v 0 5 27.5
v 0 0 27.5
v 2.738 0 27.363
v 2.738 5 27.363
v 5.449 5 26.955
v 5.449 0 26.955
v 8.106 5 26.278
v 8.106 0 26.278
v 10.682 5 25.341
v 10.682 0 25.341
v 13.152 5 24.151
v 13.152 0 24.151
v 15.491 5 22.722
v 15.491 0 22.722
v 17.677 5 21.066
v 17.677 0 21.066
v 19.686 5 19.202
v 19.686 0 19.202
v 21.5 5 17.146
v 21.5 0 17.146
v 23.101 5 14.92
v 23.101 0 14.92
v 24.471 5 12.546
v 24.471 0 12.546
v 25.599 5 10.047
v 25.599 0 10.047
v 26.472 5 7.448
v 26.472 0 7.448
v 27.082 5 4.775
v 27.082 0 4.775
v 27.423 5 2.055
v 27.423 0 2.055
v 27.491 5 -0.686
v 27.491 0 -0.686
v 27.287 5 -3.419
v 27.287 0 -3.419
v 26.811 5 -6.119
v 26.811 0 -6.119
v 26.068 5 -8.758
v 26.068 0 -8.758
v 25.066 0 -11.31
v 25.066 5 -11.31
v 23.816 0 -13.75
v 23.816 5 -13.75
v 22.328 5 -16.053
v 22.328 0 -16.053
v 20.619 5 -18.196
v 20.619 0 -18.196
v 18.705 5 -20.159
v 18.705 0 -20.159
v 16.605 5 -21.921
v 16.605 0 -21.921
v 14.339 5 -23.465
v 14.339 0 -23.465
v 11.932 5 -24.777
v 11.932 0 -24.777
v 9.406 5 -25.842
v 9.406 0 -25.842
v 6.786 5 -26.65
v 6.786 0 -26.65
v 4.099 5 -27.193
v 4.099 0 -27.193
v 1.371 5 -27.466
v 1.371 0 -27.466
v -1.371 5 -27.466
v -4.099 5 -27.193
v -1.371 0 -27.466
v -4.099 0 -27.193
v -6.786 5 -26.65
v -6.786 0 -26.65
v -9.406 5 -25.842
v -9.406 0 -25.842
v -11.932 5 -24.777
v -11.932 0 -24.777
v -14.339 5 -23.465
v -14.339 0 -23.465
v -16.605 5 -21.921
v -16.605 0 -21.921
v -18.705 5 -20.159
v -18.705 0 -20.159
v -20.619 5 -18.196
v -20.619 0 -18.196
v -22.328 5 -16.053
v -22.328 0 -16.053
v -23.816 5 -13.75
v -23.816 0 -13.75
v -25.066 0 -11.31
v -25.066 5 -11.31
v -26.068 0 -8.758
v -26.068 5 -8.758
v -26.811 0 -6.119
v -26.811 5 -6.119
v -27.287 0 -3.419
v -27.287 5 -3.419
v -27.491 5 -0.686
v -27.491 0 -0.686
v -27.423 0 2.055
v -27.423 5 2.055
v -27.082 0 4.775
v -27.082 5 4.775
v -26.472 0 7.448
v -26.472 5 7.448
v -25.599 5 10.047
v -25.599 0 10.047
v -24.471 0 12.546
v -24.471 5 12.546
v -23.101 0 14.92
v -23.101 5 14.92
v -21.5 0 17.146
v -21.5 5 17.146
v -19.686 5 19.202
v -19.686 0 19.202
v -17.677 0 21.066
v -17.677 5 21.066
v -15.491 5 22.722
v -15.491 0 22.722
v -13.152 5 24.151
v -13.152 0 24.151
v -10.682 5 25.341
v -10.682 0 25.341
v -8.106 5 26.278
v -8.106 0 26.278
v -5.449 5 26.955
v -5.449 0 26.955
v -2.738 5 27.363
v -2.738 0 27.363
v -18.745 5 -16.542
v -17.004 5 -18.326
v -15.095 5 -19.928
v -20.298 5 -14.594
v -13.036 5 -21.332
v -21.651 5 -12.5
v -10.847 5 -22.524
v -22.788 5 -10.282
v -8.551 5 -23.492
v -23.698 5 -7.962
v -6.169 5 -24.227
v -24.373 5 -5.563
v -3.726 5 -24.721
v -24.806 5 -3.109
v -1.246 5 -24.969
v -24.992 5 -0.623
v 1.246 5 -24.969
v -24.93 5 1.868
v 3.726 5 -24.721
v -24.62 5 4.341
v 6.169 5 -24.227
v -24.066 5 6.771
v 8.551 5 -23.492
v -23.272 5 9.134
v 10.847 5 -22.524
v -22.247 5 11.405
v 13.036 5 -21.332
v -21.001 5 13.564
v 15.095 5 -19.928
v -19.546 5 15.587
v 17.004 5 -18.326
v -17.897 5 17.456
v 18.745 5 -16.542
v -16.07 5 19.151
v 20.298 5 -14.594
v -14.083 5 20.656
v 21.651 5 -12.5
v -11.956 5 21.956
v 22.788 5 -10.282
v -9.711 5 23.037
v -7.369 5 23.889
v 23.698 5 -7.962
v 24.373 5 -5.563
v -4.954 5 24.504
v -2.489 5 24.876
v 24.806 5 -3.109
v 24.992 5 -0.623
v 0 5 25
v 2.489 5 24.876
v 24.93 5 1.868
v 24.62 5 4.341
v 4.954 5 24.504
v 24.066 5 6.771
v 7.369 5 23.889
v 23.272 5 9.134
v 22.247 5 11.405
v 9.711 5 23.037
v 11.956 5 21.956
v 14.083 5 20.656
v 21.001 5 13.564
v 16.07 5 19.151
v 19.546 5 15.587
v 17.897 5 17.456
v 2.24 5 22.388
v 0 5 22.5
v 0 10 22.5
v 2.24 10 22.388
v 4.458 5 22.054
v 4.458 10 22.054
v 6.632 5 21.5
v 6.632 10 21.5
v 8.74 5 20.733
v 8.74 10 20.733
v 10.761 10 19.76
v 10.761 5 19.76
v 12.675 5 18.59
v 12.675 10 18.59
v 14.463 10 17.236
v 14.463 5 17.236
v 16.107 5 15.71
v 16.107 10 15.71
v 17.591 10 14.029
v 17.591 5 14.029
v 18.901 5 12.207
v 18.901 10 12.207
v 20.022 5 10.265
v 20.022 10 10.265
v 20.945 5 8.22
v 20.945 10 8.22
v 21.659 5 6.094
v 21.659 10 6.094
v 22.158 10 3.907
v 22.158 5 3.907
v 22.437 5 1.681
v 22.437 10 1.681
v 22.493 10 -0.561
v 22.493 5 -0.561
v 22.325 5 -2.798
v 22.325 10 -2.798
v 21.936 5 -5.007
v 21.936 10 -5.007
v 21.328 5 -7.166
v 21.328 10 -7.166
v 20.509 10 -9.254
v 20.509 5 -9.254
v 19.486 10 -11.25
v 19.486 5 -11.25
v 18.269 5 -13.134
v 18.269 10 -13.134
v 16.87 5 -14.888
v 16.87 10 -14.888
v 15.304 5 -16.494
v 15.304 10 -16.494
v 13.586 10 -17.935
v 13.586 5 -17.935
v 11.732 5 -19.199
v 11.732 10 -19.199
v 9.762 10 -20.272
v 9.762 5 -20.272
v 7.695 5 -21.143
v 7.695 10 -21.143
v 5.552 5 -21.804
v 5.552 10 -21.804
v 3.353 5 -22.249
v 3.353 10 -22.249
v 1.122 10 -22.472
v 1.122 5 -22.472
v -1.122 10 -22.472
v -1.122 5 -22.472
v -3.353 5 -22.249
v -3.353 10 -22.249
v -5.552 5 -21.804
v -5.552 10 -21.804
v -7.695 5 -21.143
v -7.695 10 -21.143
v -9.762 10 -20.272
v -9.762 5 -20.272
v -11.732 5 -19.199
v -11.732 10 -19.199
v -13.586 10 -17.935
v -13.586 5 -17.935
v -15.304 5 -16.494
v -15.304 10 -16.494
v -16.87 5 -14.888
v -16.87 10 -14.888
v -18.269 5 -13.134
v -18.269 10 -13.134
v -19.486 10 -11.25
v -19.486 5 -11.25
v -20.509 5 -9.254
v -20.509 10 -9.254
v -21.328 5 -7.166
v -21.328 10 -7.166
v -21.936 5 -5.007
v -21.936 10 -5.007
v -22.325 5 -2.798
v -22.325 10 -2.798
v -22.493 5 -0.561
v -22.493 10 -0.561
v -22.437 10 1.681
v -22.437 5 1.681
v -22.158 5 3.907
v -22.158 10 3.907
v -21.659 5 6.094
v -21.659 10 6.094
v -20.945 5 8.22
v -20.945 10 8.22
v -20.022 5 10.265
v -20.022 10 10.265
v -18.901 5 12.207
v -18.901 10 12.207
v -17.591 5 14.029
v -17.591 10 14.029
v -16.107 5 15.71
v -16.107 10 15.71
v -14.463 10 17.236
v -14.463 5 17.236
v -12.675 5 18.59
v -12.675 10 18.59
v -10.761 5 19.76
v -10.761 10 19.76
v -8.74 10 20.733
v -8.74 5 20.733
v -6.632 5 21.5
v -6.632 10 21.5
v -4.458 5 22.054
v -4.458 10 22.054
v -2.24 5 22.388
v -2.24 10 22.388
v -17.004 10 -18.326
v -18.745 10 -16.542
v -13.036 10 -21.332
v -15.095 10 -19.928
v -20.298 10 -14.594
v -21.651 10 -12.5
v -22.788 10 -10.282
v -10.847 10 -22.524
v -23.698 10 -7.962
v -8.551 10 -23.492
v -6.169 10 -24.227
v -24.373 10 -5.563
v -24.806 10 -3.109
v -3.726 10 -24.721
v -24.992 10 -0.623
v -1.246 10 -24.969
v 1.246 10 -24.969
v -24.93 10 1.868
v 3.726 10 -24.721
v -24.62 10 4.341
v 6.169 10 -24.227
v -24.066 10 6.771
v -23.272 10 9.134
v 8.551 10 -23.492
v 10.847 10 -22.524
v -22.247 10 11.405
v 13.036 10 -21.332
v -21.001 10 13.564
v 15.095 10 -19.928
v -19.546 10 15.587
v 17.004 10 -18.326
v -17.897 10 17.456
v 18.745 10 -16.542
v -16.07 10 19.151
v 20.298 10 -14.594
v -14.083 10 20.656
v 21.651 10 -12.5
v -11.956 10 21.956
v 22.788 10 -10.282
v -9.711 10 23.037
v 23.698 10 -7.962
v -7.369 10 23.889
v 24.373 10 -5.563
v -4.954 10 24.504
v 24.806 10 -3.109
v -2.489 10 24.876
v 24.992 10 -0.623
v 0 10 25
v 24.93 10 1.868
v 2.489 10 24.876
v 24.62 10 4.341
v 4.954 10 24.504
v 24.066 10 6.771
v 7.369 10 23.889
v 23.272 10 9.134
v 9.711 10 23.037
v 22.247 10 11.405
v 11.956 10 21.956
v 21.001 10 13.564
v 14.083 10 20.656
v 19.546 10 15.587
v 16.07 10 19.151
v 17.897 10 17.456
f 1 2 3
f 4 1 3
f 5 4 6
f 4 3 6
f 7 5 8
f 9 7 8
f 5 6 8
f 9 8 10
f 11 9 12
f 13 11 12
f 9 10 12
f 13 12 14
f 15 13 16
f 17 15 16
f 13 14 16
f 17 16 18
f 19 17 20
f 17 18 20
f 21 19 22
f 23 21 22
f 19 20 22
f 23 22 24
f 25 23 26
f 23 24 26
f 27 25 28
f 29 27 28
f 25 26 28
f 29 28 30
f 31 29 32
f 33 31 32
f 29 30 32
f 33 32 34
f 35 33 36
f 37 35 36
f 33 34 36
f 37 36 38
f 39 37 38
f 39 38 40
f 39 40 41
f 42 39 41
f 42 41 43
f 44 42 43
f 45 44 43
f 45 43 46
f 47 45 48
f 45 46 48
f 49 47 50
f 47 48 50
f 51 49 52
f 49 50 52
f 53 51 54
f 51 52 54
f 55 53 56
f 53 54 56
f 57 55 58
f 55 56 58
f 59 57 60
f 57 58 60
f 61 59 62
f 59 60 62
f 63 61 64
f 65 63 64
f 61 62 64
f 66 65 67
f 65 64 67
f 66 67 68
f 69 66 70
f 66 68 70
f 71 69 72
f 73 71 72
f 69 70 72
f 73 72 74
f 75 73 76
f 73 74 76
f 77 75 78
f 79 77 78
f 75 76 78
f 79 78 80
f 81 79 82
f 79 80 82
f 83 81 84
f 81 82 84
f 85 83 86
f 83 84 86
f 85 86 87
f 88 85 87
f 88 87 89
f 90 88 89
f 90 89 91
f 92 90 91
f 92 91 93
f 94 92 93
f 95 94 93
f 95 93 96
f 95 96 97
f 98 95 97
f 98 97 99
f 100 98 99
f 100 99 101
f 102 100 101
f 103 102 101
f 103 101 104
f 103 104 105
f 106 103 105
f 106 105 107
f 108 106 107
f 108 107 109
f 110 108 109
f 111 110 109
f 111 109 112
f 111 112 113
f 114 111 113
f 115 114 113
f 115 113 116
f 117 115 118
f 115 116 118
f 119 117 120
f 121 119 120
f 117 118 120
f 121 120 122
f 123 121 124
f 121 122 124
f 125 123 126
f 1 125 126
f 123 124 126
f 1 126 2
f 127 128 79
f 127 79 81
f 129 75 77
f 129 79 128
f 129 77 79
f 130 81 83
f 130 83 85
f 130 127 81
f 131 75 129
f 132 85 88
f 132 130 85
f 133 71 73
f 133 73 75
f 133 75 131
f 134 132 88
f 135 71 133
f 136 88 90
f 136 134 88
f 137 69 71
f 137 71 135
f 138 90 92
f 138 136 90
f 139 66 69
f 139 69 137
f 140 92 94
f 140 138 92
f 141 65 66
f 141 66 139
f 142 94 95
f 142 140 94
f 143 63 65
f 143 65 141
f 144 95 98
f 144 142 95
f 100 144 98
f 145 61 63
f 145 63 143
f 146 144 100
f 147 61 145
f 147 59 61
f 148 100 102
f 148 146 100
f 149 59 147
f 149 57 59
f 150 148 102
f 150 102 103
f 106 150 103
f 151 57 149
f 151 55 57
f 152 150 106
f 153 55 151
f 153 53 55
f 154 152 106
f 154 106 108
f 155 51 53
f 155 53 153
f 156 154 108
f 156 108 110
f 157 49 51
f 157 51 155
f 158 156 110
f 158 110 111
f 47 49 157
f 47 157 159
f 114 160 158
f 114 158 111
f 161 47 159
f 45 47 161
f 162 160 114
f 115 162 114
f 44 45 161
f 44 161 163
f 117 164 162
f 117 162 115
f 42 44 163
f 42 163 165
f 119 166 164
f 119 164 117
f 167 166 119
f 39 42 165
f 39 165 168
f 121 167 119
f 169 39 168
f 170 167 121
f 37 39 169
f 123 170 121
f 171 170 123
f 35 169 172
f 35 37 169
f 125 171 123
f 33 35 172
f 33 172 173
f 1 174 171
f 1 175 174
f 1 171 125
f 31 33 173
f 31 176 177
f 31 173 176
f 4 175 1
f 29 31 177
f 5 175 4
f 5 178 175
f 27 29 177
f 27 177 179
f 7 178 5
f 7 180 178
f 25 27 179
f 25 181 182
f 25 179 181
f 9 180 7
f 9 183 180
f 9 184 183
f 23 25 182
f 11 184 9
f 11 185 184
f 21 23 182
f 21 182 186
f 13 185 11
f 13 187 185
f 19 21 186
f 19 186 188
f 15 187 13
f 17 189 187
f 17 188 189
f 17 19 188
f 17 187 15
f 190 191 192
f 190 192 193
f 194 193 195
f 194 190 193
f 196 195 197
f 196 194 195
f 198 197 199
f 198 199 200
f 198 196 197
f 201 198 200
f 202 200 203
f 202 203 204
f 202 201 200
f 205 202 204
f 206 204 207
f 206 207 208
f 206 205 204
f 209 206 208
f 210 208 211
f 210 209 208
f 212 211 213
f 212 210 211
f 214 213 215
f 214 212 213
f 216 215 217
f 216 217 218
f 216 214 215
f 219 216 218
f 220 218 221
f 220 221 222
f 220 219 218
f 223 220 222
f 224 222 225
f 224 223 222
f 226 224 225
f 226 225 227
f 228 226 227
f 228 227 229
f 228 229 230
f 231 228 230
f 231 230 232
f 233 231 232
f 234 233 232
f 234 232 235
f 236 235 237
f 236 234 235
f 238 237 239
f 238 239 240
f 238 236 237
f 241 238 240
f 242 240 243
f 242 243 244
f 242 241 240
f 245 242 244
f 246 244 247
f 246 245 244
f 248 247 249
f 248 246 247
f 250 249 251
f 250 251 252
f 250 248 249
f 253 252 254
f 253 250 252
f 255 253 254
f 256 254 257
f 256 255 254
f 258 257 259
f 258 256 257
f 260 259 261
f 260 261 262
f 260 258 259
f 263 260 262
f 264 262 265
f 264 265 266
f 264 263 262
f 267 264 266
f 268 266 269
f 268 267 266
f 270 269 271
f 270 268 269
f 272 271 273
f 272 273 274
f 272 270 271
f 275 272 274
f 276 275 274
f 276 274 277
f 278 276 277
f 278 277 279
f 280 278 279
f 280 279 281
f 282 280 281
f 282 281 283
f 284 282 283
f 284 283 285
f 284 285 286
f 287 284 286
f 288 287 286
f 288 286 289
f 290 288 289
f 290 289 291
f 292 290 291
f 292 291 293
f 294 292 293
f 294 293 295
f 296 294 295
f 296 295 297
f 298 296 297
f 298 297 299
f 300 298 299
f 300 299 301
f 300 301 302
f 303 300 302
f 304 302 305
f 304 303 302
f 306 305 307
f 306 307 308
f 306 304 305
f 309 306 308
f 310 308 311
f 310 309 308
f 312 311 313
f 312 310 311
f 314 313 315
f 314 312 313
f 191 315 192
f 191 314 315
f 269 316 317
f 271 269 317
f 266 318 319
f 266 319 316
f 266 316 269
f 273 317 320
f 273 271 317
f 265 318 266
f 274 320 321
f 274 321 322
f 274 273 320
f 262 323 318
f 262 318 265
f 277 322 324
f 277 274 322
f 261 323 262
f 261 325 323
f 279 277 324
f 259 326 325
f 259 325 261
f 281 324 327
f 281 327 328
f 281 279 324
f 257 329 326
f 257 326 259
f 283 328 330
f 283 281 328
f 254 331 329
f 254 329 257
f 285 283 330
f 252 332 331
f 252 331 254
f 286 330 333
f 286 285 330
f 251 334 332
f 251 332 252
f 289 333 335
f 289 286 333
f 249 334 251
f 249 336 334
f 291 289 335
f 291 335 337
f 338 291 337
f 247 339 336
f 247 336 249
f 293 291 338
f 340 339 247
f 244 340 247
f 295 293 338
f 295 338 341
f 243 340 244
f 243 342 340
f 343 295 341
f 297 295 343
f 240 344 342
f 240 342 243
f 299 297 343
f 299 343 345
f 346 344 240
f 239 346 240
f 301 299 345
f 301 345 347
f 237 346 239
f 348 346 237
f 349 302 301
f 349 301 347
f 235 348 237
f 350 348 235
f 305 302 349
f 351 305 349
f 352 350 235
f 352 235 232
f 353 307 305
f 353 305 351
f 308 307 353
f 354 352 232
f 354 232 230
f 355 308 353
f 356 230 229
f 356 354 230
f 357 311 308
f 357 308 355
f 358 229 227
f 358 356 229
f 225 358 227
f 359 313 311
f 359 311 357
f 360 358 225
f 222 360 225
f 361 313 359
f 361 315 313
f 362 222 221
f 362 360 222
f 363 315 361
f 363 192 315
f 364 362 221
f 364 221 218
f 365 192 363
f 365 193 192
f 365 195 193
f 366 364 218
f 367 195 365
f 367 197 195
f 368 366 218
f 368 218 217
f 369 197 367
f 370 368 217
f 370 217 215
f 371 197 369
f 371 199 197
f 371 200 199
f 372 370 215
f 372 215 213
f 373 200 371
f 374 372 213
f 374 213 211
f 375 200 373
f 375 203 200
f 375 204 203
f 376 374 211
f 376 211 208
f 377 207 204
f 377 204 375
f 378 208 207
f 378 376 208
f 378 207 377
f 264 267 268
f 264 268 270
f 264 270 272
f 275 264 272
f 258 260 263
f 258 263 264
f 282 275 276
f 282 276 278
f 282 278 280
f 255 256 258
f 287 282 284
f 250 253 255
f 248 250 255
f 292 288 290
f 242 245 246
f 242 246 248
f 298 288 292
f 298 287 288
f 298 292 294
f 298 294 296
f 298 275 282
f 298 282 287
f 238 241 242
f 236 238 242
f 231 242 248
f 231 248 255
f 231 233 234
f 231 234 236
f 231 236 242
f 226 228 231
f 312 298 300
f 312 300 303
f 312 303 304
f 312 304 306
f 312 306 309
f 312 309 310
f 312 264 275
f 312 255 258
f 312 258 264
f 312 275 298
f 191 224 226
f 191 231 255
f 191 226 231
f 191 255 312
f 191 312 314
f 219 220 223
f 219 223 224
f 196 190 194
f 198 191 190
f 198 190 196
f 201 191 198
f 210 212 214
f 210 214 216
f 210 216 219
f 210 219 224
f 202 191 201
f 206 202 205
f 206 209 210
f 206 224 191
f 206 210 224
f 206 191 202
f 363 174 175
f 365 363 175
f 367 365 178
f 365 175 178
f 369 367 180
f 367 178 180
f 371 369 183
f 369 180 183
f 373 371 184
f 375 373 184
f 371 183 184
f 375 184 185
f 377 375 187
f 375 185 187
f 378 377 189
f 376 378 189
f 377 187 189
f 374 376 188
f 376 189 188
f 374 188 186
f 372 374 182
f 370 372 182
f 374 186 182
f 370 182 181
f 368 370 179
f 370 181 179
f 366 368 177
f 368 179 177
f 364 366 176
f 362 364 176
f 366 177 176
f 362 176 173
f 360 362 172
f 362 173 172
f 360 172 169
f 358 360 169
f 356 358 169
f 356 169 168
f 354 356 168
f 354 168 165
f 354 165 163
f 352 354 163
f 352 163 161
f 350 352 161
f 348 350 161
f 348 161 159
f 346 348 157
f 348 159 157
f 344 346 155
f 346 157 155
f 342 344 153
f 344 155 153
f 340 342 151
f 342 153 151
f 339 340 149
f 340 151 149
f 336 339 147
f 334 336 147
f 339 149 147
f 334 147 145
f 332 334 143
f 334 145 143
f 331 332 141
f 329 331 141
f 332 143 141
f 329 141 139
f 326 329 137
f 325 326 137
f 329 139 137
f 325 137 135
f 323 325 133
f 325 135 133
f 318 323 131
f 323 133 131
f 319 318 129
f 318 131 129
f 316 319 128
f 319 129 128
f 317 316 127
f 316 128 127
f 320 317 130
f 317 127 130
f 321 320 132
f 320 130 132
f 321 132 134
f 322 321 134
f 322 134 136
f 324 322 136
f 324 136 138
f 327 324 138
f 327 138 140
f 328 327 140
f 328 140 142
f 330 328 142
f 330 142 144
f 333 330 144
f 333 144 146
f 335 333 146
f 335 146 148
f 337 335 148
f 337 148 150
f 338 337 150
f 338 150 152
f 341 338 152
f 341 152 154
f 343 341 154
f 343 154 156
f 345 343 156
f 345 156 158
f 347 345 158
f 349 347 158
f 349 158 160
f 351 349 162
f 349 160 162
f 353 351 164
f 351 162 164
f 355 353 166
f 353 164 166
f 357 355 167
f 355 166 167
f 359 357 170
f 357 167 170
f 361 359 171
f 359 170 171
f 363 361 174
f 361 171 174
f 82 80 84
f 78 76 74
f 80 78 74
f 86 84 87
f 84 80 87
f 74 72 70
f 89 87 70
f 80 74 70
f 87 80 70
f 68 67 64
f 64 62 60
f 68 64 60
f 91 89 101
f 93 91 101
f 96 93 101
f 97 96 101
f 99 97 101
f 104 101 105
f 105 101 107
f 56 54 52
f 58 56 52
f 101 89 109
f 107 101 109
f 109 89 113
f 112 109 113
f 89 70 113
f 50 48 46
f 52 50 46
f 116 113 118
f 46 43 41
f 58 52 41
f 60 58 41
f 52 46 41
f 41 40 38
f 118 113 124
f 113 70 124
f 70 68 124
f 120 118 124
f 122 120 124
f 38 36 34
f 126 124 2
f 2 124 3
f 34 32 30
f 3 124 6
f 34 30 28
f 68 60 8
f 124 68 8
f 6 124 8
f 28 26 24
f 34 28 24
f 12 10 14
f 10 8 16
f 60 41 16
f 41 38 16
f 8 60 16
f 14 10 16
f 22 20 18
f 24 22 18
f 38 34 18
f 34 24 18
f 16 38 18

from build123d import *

# Parameters (mm, degrees)
SKETCH1_R           = 27.5
BOSS_EXTRUDE1_DEPTH = 5
SKETCH2_R           = 25
SKETCH2_R_2         = 22.5
BOSS_EXTRUDE2_DEPTH = 5


with BuildPart() as part:
    # Sketch1 → Boss-Extrude1 (new body)
    with BuildSketch(Plane(origin=(0, 0, 0), x_dir=(1, 0, 0), z_dir=(0, 1, 0))):
        with Locations(Location((0, 0, 0), (0, 0, 270))):  # turned: the seam where the file's is
            Circle(SKETCH1_R)
    extrude(amount=BOSS_EXTRUDE1_DEPTH)

    # Sketch2 → Boss-Extrude2 (add)
    with BuildSketch(Plane(origin=(0, 5, 0), x_dir=(1, 0, 0), z_dir=(0, 1, 0))):
        with Locations(Location((0, 0, 0), (0, 0, 270))):  # turned: the seam where the file's is
            Circle(SKETCH2_R)
        with Locations(Location((0, 0, 0), (0, 0, 270))):  # turned: the seam where the file's is
            Circle(SKETCH2_R_2, mode=Mode.SUBTRACT)
    extrude(amount=BOSS_EXTRUDE2_DEPTH)


solid = part.part
